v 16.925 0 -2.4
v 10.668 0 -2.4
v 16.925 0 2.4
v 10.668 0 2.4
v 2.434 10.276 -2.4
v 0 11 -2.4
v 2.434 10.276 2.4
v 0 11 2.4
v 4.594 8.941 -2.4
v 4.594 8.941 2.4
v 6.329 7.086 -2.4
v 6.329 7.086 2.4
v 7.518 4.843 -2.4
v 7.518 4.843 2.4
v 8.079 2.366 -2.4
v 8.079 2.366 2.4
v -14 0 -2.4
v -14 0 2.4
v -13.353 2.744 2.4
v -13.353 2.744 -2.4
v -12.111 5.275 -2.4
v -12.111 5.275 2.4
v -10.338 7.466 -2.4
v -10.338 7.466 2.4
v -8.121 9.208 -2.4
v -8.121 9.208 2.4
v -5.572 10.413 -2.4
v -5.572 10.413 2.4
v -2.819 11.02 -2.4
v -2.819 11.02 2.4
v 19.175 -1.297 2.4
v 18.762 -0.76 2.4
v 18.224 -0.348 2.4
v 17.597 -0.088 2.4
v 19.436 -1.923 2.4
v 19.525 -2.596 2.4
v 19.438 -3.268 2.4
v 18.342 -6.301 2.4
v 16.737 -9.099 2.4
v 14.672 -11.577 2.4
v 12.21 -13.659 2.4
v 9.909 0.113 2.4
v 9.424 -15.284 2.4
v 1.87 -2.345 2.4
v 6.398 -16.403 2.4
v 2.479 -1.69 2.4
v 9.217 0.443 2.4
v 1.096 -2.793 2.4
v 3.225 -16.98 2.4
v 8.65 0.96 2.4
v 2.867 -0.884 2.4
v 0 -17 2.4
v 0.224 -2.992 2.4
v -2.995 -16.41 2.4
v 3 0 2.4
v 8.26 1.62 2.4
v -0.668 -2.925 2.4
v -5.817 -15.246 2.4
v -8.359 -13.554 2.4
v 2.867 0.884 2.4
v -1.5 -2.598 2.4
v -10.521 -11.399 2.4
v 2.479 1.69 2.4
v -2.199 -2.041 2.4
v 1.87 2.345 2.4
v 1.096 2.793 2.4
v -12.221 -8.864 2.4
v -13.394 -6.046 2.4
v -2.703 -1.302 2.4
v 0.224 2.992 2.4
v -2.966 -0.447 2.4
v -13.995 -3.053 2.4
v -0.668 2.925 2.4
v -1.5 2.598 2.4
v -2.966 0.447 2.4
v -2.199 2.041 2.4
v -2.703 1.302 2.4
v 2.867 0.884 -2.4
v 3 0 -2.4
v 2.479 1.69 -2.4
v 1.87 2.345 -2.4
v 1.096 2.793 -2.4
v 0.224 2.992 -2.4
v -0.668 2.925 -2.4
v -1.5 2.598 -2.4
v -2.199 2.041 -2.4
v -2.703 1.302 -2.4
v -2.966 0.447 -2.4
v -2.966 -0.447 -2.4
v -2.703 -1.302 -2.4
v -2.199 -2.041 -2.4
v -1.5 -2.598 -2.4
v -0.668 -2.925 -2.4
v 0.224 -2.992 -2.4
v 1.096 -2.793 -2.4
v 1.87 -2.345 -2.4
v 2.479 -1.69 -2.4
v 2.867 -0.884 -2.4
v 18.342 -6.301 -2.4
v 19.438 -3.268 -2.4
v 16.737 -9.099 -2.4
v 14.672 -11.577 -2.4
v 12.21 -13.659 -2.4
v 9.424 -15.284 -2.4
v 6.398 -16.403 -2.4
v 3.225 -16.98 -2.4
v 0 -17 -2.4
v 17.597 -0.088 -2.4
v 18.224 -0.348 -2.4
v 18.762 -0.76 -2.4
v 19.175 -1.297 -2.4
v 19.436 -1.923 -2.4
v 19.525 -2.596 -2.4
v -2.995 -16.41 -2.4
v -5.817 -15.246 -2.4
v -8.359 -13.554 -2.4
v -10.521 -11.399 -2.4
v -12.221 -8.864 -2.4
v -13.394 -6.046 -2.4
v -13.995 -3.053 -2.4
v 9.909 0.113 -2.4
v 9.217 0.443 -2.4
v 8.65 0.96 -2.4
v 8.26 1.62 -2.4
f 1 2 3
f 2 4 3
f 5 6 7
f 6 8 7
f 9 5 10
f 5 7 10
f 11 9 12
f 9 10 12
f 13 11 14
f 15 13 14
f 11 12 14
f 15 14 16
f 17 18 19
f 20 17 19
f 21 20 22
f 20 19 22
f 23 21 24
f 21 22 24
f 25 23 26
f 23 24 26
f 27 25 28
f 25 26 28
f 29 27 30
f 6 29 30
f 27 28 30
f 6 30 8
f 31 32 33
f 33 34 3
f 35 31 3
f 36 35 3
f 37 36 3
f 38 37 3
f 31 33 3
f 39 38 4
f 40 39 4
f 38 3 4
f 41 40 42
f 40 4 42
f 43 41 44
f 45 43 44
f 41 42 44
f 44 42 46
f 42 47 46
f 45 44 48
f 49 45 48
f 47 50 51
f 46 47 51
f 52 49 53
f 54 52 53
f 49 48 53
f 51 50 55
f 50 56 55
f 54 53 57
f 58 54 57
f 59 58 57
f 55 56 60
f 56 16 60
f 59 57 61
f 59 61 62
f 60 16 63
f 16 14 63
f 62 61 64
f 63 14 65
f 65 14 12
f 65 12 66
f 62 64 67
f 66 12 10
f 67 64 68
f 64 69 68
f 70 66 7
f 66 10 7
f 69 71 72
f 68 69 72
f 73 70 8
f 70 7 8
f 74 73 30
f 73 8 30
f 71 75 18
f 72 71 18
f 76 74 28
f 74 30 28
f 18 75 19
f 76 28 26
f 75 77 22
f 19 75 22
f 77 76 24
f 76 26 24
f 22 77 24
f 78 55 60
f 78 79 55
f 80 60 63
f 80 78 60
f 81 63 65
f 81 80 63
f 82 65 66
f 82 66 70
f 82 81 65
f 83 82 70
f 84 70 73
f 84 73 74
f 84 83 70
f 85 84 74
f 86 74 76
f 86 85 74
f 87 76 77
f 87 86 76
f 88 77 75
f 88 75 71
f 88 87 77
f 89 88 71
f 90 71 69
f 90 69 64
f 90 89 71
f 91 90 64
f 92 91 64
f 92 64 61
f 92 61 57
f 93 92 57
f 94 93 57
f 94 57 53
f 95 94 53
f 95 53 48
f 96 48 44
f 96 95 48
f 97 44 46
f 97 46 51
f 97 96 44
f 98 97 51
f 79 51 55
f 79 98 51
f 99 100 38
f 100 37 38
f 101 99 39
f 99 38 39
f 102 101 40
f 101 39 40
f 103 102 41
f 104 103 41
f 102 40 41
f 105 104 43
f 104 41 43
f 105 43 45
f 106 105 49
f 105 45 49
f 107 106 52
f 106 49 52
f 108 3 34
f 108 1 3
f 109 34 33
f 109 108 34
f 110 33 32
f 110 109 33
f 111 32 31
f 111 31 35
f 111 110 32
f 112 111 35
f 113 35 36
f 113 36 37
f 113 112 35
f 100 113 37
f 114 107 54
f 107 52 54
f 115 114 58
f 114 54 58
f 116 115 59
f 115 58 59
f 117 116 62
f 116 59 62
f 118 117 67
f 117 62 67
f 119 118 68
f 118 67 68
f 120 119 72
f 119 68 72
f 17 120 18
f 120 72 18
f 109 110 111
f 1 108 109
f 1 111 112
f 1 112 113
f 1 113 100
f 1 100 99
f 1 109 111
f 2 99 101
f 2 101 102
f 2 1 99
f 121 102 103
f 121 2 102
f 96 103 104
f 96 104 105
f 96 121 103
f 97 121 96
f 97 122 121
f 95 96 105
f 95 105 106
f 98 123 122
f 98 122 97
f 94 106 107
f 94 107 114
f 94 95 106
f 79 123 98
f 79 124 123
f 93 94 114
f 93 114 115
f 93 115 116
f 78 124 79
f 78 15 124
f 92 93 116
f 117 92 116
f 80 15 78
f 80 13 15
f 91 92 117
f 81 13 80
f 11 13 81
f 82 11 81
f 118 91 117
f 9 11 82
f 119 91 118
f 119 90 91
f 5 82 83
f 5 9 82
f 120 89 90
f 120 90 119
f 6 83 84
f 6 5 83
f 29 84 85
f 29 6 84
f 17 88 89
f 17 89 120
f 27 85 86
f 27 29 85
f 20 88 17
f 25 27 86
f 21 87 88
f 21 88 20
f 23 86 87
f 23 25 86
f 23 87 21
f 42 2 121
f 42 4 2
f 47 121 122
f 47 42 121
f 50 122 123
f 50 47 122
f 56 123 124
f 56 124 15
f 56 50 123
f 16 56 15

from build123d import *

# Parameters (mm, degrees)
SKETCH1_R           = 3
BOSS_EXTRUDE1_DEPTH = 2.4
FILLET1_R           = 2.6


with BuildPart() as part:
    # Sketch1 → Boss-Extrude1 (new body, symmetric)
    with BuildSketch(Plane.XY):
        with BuildLine():
            Line((8, 0), (20, 0))
            ThreePointArc((20, 0), (13.52081528, -12.642135624), (0, -17))
            ThreePointArc((0, -17), (-10.52081528, -11.399494937), (-14, 0))
            ThreePointArc((-14, 0), (-9.278174593, 8.399494937), (0, 11))
            ThreePointArc((0, 11), (6.278174593, 7.156854249), (8, 0))
        make_face()
        Circle(SKETCH1_R, mode=Mode.SUBTRACT)
    extrude(amount=BOSS_EXTRUDE1_DEPTH, both=True)

    # Fillet1
    fillet1_edges = [part.edges().sort_by_distance(p)[0] for p in [
        (8, 0, 0),
        (20, 0, 0),
    ]]
    fillet(fillet1_edges, radius=FILLET1_R)


solid = part.part
